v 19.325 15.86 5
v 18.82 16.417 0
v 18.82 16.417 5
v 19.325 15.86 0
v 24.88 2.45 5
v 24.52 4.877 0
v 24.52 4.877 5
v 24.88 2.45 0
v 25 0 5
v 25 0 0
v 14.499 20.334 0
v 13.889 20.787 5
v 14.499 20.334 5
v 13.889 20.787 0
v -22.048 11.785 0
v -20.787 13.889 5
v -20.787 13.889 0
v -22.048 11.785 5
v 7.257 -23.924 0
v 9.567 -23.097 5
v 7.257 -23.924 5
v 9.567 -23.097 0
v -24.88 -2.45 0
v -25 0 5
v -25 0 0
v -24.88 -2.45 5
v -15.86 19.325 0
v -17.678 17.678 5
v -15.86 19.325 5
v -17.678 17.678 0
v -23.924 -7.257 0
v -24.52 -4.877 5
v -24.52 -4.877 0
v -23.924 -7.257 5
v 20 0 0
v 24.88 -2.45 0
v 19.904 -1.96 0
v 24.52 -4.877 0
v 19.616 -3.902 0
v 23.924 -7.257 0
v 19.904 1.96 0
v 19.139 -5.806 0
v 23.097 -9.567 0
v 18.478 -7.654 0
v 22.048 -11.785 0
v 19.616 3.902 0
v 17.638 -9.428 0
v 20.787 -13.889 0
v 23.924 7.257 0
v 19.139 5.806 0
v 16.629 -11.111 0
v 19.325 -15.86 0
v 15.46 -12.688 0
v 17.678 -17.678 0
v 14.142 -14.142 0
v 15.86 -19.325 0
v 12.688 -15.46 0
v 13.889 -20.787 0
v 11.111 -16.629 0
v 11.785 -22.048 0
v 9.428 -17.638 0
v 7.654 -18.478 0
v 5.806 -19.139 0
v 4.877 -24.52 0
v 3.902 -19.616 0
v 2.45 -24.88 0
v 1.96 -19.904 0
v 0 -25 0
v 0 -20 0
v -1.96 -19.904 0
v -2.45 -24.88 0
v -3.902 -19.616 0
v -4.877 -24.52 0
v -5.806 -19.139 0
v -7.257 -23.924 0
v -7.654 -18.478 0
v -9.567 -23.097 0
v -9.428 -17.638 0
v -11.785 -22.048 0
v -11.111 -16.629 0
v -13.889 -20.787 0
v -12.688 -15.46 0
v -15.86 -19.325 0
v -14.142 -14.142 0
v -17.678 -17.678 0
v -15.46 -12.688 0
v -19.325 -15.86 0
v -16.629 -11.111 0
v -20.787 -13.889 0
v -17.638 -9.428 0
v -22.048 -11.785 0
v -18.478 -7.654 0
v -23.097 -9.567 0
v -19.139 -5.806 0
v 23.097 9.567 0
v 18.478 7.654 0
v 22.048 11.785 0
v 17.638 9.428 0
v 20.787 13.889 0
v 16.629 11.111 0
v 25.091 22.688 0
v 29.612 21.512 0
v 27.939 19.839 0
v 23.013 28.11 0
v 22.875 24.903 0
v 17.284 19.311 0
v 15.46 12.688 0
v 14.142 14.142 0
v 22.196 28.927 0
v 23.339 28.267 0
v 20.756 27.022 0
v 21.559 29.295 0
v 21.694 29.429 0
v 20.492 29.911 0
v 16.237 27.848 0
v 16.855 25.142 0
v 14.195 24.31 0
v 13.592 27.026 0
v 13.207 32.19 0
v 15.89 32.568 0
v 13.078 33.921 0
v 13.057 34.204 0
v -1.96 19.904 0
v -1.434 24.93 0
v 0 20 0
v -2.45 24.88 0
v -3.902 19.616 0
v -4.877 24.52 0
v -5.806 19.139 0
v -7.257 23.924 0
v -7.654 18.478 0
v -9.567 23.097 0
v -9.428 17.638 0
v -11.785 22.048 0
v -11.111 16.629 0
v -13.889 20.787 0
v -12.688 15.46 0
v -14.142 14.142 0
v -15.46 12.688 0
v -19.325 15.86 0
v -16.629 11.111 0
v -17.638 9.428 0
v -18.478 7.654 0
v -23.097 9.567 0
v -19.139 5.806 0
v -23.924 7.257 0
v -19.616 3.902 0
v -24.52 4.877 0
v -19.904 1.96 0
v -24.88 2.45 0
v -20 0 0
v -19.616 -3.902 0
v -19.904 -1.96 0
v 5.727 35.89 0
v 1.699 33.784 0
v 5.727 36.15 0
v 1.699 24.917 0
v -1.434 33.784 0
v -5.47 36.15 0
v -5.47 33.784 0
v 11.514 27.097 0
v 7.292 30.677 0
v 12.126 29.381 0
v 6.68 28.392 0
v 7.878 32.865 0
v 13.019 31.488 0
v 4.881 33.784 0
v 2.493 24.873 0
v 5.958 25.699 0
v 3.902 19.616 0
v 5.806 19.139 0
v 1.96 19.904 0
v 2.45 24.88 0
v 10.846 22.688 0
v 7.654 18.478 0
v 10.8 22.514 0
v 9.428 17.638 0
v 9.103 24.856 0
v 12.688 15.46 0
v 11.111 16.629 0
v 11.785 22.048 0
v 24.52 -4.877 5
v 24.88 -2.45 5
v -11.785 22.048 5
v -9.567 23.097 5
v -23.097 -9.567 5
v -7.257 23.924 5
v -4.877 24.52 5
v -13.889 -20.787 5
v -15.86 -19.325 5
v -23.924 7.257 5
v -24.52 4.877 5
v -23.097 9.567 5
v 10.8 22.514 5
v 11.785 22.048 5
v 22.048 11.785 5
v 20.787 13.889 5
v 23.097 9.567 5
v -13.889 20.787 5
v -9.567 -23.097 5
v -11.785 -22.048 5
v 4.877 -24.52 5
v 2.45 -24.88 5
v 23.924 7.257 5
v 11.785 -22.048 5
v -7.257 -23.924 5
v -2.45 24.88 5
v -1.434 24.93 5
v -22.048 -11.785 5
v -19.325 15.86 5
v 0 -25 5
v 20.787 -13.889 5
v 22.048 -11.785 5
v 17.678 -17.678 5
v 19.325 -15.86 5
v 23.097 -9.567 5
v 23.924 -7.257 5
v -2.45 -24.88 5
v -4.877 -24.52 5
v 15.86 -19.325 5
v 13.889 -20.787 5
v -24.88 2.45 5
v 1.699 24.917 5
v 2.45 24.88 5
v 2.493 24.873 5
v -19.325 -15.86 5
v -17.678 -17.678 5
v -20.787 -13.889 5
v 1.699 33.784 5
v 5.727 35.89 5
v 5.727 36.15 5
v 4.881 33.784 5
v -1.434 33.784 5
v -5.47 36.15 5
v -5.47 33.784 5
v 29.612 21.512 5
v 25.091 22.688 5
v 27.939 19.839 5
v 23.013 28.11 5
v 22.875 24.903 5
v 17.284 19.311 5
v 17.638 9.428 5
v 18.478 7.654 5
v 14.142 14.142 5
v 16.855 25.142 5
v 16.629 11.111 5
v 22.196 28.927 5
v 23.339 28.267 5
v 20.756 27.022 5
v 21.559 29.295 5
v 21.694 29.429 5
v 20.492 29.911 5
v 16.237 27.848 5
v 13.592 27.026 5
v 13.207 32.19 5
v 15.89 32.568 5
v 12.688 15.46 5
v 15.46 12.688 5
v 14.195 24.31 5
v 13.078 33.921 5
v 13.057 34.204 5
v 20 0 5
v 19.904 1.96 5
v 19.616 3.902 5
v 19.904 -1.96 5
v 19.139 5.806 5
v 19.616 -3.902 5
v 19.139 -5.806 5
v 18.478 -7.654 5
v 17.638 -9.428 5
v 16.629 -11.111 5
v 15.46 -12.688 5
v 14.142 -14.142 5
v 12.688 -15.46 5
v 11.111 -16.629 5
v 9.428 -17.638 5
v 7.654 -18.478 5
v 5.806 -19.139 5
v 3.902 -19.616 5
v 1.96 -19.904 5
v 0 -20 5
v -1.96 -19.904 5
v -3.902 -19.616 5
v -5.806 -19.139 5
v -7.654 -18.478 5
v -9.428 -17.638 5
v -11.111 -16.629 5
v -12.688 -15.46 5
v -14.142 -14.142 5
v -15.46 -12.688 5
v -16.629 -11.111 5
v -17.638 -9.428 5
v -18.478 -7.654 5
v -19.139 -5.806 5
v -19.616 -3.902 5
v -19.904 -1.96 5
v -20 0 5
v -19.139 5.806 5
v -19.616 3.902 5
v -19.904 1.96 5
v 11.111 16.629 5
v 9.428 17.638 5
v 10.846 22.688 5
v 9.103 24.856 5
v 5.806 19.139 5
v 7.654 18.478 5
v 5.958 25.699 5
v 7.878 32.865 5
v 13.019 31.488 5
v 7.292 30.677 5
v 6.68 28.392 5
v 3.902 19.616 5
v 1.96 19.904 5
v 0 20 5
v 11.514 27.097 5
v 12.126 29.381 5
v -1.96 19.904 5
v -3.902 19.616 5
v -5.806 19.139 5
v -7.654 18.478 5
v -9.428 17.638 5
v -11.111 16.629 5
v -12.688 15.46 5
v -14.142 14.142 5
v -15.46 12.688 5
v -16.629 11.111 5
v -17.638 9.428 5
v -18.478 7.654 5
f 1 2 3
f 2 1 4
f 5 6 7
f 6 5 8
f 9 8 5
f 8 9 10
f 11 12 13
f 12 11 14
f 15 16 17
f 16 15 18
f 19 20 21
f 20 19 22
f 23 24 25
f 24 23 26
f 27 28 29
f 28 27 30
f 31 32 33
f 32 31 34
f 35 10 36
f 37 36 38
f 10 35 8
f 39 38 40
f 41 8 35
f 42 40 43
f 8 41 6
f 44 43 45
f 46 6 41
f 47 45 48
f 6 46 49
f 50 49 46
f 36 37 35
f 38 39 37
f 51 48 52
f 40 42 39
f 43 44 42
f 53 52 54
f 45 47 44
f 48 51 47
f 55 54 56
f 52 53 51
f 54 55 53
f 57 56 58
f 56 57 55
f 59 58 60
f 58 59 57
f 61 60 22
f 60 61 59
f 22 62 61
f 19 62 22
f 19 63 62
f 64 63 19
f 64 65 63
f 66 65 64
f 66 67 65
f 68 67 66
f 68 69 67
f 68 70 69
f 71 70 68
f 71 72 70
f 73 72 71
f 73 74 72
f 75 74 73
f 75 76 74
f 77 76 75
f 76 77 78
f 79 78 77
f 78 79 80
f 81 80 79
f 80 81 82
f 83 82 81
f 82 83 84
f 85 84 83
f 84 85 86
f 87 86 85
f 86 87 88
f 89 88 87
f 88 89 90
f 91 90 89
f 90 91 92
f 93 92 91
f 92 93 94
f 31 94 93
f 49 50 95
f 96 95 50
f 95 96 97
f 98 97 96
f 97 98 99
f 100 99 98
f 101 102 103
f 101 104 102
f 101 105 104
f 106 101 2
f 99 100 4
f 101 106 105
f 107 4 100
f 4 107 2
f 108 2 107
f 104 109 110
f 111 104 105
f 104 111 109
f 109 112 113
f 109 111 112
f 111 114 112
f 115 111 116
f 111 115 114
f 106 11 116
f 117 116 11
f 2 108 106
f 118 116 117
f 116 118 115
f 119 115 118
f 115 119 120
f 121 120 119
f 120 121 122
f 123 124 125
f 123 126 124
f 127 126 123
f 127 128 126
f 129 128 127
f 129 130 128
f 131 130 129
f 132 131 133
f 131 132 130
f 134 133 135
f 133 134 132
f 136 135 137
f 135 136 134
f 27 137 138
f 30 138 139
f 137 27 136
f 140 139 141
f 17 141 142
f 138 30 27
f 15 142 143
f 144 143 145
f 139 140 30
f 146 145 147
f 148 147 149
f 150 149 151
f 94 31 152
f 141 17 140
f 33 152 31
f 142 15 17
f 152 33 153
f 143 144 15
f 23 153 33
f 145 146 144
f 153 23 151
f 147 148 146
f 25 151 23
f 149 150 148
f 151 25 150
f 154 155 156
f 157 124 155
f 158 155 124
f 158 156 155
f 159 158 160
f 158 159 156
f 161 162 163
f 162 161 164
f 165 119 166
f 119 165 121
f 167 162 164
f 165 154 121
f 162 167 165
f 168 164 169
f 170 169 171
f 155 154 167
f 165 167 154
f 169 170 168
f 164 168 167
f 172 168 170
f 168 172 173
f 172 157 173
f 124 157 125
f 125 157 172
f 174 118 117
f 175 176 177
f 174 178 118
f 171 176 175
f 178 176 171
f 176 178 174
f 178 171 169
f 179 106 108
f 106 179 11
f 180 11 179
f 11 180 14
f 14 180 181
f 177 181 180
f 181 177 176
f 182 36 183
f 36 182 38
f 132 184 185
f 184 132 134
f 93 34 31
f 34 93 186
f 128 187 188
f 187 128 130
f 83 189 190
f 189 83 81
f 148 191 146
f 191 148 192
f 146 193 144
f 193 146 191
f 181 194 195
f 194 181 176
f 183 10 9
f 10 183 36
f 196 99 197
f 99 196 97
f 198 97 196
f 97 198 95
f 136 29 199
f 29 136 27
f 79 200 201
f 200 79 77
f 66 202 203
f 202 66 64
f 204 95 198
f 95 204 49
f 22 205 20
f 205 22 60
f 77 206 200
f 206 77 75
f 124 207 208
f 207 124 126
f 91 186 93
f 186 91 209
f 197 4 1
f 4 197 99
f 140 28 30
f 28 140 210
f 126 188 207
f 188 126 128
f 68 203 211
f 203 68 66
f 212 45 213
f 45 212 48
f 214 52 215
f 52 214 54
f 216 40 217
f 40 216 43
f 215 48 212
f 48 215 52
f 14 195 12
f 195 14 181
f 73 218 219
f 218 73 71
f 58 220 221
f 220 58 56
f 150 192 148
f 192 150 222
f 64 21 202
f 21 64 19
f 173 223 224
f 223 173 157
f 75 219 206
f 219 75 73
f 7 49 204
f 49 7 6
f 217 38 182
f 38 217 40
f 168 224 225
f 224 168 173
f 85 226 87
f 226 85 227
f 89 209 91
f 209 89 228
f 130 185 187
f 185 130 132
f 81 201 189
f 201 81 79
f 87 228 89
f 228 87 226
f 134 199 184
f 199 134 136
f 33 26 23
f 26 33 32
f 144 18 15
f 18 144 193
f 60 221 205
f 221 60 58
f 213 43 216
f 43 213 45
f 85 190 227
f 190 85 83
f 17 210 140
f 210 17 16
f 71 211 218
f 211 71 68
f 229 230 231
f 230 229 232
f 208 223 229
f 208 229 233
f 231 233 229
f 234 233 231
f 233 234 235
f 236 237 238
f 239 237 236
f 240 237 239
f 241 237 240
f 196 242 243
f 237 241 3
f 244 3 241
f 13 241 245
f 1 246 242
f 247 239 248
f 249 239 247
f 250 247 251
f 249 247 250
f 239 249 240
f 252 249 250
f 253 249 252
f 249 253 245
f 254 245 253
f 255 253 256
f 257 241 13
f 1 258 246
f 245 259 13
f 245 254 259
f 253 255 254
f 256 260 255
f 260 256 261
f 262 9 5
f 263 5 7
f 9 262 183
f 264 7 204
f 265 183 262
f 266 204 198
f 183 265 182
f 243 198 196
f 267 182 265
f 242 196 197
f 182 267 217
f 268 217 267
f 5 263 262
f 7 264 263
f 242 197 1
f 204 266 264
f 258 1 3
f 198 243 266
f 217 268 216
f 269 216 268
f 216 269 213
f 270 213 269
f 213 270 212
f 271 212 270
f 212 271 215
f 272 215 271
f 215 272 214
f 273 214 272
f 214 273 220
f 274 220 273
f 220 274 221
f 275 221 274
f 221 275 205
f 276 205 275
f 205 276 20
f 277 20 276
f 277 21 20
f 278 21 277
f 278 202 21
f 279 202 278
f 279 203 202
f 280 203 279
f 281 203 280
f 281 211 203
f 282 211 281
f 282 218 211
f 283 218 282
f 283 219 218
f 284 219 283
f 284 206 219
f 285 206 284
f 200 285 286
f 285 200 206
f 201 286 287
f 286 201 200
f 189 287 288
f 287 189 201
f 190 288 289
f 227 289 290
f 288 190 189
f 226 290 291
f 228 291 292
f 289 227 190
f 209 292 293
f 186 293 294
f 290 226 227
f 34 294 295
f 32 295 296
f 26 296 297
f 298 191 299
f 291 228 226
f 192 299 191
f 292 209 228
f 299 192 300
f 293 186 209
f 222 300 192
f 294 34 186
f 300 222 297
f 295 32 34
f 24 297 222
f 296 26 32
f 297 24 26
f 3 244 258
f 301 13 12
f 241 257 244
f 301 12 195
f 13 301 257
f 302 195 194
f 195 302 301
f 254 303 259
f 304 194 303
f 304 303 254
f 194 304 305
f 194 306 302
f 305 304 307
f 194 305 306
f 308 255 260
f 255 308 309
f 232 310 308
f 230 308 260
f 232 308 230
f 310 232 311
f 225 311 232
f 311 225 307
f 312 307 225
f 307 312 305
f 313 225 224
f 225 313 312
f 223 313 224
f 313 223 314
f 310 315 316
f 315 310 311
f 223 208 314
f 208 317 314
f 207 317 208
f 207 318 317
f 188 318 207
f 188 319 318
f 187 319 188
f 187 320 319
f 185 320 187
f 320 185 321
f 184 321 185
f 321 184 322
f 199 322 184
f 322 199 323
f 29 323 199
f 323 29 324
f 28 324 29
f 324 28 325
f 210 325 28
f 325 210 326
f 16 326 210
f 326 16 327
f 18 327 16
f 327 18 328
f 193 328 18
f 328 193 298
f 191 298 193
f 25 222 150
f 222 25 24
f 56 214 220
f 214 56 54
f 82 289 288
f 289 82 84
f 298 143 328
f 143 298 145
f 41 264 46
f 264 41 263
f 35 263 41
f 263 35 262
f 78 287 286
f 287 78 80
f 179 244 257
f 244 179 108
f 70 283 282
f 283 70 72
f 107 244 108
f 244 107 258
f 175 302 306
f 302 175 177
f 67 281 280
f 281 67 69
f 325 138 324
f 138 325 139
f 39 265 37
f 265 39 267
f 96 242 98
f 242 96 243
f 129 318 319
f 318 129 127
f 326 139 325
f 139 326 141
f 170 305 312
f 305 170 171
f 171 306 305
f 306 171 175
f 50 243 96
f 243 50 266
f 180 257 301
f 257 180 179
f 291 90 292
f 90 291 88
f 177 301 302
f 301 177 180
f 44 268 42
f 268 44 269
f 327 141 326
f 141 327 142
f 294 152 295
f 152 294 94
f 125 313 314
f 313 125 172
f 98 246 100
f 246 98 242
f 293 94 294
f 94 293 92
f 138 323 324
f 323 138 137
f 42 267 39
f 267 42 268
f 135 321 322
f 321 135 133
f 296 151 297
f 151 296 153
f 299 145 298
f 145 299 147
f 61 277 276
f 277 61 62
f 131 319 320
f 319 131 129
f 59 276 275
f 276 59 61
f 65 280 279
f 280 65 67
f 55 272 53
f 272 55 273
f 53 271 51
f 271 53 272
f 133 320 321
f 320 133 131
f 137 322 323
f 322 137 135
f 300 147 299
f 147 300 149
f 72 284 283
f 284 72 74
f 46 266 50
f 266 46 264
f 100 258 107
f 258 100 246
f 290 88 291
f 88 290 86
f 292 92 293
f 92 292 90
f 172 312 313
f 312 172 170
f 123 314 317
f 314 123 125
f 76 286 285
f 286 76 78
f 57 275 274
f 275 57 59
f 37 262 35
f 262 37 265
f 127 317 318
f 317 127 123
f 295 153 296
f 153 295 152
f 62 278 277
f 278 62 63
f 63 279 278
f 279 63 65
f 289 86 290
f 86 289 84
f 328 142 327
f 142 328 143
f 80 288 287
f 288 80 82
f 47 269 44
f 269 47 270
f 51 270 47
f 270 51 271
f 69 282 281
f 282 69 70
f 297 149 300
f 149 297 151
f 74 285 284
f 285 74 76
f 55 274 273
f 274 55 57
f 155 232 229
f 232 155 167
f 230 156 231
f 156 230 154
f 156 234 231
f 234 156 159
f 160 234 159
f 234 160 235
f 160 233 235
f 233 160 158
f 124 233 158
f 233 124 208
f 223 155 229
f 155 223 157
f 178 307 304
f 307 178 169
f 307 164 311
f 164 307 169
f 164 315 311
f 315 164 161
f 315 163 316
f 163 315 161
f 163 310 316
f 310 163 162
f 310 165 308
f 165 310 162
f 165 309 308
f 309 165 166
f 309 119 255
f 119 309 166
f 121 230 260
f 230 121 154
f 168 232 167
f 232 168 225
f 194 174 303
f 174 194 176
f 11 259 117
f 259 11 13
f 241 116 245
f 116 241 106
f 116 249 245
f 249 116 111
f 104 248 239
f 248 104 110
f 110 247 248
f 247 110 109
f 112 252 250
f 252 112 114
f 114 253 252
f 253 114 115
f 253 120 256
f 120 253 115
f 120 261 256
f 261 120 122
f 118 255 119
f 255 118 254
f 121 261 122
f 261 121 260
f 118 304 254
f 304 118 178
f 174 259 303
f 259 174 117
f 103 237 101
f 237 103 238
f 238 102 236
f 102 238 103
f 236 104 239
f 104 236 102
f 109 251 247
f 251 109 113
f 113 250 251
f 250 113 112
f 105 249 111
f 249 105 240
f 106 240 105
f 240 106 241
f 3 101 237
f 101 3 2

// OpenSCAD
//CUSTOMIZER VARIABLES

// Name or Text
Text = "TEXT";

// Adjust spacing between letters
Degrees = 15; //  [13,14,15,16,17]

//CUSTOMIZER VARIABLES END

module L_0(char = "A", Degrees = 15, i = 0) {
    rotate([0,0,-Degrees*i])
    translate([0,24,0])
    linear_extrude(height = 5)
    text(size = 12, text = char, font = "Chewy:style=bold", halign = "center", valign= "bottom", $fn = 32);
}

union() {
    difference() {
        cylinder(h = 5, r = 25, $fn = 64);
        translate([0,0,-0.1])
        cylinder(h = 5.2, r = 20, $fn = 64);
    }
    
    union() {
        for (i = [0:len(Text)-1]) {
            L_0(Text[i], Degrees, i);
        }
    }
}
